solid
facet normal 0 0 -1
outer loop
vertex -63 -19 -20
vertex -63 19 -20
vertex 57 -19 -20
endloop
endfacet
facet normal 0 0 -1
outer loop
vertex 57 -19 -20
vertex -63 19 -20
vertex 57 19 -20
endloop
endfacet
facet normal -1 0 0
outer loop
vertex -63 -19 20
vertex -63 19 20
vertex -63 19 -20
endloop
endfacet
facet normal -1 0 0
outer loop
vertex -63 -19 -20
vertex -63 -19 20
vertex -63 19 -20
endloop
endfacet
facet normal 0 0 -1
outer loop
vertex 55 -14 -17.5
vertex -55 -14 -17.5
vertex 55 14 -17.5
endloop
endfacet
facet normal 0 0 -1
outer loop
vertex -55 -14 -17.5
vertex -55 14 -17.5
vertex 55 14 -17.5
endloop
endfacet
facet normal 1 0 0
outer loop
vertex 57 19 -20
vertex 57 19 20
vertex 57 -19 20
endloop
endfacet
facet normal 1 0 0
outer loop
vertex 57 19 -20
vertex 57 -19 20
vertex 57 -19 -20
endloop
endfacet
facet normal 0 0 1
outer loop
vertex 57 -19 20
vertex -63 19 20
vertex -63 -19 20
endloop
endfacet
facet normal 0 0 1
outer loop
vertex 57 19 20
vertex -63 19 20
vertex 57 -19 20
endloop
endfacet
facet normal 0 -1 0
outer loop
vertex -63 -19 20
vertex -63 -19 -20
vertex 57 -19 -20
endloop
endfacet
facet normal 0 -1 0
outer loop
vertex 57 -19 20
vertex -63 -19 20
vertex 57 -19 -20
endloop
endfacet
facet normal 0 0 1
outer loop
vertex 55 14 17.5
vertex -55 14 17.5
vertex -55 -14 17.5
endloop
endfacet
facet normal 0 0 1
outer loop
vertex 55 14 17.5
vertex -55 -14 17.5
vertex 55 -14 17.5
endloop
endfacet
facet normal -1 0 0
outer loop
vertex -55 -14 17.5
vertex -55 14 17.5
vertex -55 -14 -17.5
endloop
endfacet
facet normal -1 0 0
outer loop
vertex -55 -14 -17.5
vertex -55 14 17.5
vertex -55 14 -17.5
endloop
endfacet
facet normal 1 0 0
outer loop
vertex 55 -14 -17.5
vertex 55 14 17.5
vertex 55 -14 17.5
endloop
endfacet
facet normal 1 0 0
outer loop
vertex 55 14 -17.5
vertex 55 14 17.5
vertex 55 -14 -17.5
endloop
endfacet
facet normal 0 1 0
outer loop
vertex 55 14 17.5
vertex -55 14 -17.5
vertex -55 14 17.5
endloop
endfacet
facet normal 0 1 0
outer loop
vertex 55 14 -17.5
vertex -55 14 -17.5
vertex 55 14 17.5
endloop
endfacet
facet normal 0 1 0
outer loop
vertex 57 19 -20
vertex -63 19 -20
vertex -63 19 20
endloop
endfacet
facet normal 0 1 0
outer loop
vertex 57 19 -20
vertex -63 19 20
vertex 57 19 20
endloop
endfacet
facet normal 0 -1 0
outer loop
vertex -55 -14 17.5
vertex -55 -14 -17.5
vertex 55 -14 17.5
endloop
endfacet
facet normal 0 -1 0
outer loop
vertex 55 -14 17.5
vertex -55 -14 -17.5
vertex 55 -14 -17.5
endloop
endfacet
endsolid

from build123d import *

# Parameters (mm, degrees)
BOSS_EXTRUDE1_DEPTH      = 14
BOSS_EXTRUDE1_DEPTH_BACK = 14
SKETCH1_W                = 110
SKETCH1_H                = 35
BOSS_EXTRUDE2_DEPTH      = 19
BOSS_EXTRUDE2_DEPTH_BACK = 19
SKETCH2_W                = 120
SKETCH2_H                = 40


with BuildPart() as part:
    # Sketch1 → Boss-Extrude1 (new, two sides: drawn at the far end of the back side and taken through both)
    with BuildSketch(Plane(origin=(0, 0, 0), x_dir=(1, 0, 0), z_dir=(0, 1, 0)).offset(-BOSS_EXTRUDE1_DEPTH_BACK)):
        Rectangle(SKETCH1_W, SKETCH1_H)
    extrude(amount=BOSS_EXTRUDE1_DEPTH + BOSS_EXTRUDE1_DEPTH_BACK)


with BuildPart() as body_2:
    # Sketch2 → Boss-Extrude2 (new, two sides: drawn at the far end of the back side and taken through both)
    with BuildSketch(Plane(origin=(0, 0, 0), x_dir=(1, 0, 0), z_dir=(0, 1, 0)).offset(-BOSS_EXTRUDE2_DEPTH_BACK)):
        with Locations((-3, 0)):
            Rectangle(SKETCH2_W, SKETCH2_H)
    extrude(amount=BOSS_EXTRUDE2_DEPTH + BOSS_EXTRUDE2_DEPTH_BACK)


solid = Compound([part.part, body_2.part])
